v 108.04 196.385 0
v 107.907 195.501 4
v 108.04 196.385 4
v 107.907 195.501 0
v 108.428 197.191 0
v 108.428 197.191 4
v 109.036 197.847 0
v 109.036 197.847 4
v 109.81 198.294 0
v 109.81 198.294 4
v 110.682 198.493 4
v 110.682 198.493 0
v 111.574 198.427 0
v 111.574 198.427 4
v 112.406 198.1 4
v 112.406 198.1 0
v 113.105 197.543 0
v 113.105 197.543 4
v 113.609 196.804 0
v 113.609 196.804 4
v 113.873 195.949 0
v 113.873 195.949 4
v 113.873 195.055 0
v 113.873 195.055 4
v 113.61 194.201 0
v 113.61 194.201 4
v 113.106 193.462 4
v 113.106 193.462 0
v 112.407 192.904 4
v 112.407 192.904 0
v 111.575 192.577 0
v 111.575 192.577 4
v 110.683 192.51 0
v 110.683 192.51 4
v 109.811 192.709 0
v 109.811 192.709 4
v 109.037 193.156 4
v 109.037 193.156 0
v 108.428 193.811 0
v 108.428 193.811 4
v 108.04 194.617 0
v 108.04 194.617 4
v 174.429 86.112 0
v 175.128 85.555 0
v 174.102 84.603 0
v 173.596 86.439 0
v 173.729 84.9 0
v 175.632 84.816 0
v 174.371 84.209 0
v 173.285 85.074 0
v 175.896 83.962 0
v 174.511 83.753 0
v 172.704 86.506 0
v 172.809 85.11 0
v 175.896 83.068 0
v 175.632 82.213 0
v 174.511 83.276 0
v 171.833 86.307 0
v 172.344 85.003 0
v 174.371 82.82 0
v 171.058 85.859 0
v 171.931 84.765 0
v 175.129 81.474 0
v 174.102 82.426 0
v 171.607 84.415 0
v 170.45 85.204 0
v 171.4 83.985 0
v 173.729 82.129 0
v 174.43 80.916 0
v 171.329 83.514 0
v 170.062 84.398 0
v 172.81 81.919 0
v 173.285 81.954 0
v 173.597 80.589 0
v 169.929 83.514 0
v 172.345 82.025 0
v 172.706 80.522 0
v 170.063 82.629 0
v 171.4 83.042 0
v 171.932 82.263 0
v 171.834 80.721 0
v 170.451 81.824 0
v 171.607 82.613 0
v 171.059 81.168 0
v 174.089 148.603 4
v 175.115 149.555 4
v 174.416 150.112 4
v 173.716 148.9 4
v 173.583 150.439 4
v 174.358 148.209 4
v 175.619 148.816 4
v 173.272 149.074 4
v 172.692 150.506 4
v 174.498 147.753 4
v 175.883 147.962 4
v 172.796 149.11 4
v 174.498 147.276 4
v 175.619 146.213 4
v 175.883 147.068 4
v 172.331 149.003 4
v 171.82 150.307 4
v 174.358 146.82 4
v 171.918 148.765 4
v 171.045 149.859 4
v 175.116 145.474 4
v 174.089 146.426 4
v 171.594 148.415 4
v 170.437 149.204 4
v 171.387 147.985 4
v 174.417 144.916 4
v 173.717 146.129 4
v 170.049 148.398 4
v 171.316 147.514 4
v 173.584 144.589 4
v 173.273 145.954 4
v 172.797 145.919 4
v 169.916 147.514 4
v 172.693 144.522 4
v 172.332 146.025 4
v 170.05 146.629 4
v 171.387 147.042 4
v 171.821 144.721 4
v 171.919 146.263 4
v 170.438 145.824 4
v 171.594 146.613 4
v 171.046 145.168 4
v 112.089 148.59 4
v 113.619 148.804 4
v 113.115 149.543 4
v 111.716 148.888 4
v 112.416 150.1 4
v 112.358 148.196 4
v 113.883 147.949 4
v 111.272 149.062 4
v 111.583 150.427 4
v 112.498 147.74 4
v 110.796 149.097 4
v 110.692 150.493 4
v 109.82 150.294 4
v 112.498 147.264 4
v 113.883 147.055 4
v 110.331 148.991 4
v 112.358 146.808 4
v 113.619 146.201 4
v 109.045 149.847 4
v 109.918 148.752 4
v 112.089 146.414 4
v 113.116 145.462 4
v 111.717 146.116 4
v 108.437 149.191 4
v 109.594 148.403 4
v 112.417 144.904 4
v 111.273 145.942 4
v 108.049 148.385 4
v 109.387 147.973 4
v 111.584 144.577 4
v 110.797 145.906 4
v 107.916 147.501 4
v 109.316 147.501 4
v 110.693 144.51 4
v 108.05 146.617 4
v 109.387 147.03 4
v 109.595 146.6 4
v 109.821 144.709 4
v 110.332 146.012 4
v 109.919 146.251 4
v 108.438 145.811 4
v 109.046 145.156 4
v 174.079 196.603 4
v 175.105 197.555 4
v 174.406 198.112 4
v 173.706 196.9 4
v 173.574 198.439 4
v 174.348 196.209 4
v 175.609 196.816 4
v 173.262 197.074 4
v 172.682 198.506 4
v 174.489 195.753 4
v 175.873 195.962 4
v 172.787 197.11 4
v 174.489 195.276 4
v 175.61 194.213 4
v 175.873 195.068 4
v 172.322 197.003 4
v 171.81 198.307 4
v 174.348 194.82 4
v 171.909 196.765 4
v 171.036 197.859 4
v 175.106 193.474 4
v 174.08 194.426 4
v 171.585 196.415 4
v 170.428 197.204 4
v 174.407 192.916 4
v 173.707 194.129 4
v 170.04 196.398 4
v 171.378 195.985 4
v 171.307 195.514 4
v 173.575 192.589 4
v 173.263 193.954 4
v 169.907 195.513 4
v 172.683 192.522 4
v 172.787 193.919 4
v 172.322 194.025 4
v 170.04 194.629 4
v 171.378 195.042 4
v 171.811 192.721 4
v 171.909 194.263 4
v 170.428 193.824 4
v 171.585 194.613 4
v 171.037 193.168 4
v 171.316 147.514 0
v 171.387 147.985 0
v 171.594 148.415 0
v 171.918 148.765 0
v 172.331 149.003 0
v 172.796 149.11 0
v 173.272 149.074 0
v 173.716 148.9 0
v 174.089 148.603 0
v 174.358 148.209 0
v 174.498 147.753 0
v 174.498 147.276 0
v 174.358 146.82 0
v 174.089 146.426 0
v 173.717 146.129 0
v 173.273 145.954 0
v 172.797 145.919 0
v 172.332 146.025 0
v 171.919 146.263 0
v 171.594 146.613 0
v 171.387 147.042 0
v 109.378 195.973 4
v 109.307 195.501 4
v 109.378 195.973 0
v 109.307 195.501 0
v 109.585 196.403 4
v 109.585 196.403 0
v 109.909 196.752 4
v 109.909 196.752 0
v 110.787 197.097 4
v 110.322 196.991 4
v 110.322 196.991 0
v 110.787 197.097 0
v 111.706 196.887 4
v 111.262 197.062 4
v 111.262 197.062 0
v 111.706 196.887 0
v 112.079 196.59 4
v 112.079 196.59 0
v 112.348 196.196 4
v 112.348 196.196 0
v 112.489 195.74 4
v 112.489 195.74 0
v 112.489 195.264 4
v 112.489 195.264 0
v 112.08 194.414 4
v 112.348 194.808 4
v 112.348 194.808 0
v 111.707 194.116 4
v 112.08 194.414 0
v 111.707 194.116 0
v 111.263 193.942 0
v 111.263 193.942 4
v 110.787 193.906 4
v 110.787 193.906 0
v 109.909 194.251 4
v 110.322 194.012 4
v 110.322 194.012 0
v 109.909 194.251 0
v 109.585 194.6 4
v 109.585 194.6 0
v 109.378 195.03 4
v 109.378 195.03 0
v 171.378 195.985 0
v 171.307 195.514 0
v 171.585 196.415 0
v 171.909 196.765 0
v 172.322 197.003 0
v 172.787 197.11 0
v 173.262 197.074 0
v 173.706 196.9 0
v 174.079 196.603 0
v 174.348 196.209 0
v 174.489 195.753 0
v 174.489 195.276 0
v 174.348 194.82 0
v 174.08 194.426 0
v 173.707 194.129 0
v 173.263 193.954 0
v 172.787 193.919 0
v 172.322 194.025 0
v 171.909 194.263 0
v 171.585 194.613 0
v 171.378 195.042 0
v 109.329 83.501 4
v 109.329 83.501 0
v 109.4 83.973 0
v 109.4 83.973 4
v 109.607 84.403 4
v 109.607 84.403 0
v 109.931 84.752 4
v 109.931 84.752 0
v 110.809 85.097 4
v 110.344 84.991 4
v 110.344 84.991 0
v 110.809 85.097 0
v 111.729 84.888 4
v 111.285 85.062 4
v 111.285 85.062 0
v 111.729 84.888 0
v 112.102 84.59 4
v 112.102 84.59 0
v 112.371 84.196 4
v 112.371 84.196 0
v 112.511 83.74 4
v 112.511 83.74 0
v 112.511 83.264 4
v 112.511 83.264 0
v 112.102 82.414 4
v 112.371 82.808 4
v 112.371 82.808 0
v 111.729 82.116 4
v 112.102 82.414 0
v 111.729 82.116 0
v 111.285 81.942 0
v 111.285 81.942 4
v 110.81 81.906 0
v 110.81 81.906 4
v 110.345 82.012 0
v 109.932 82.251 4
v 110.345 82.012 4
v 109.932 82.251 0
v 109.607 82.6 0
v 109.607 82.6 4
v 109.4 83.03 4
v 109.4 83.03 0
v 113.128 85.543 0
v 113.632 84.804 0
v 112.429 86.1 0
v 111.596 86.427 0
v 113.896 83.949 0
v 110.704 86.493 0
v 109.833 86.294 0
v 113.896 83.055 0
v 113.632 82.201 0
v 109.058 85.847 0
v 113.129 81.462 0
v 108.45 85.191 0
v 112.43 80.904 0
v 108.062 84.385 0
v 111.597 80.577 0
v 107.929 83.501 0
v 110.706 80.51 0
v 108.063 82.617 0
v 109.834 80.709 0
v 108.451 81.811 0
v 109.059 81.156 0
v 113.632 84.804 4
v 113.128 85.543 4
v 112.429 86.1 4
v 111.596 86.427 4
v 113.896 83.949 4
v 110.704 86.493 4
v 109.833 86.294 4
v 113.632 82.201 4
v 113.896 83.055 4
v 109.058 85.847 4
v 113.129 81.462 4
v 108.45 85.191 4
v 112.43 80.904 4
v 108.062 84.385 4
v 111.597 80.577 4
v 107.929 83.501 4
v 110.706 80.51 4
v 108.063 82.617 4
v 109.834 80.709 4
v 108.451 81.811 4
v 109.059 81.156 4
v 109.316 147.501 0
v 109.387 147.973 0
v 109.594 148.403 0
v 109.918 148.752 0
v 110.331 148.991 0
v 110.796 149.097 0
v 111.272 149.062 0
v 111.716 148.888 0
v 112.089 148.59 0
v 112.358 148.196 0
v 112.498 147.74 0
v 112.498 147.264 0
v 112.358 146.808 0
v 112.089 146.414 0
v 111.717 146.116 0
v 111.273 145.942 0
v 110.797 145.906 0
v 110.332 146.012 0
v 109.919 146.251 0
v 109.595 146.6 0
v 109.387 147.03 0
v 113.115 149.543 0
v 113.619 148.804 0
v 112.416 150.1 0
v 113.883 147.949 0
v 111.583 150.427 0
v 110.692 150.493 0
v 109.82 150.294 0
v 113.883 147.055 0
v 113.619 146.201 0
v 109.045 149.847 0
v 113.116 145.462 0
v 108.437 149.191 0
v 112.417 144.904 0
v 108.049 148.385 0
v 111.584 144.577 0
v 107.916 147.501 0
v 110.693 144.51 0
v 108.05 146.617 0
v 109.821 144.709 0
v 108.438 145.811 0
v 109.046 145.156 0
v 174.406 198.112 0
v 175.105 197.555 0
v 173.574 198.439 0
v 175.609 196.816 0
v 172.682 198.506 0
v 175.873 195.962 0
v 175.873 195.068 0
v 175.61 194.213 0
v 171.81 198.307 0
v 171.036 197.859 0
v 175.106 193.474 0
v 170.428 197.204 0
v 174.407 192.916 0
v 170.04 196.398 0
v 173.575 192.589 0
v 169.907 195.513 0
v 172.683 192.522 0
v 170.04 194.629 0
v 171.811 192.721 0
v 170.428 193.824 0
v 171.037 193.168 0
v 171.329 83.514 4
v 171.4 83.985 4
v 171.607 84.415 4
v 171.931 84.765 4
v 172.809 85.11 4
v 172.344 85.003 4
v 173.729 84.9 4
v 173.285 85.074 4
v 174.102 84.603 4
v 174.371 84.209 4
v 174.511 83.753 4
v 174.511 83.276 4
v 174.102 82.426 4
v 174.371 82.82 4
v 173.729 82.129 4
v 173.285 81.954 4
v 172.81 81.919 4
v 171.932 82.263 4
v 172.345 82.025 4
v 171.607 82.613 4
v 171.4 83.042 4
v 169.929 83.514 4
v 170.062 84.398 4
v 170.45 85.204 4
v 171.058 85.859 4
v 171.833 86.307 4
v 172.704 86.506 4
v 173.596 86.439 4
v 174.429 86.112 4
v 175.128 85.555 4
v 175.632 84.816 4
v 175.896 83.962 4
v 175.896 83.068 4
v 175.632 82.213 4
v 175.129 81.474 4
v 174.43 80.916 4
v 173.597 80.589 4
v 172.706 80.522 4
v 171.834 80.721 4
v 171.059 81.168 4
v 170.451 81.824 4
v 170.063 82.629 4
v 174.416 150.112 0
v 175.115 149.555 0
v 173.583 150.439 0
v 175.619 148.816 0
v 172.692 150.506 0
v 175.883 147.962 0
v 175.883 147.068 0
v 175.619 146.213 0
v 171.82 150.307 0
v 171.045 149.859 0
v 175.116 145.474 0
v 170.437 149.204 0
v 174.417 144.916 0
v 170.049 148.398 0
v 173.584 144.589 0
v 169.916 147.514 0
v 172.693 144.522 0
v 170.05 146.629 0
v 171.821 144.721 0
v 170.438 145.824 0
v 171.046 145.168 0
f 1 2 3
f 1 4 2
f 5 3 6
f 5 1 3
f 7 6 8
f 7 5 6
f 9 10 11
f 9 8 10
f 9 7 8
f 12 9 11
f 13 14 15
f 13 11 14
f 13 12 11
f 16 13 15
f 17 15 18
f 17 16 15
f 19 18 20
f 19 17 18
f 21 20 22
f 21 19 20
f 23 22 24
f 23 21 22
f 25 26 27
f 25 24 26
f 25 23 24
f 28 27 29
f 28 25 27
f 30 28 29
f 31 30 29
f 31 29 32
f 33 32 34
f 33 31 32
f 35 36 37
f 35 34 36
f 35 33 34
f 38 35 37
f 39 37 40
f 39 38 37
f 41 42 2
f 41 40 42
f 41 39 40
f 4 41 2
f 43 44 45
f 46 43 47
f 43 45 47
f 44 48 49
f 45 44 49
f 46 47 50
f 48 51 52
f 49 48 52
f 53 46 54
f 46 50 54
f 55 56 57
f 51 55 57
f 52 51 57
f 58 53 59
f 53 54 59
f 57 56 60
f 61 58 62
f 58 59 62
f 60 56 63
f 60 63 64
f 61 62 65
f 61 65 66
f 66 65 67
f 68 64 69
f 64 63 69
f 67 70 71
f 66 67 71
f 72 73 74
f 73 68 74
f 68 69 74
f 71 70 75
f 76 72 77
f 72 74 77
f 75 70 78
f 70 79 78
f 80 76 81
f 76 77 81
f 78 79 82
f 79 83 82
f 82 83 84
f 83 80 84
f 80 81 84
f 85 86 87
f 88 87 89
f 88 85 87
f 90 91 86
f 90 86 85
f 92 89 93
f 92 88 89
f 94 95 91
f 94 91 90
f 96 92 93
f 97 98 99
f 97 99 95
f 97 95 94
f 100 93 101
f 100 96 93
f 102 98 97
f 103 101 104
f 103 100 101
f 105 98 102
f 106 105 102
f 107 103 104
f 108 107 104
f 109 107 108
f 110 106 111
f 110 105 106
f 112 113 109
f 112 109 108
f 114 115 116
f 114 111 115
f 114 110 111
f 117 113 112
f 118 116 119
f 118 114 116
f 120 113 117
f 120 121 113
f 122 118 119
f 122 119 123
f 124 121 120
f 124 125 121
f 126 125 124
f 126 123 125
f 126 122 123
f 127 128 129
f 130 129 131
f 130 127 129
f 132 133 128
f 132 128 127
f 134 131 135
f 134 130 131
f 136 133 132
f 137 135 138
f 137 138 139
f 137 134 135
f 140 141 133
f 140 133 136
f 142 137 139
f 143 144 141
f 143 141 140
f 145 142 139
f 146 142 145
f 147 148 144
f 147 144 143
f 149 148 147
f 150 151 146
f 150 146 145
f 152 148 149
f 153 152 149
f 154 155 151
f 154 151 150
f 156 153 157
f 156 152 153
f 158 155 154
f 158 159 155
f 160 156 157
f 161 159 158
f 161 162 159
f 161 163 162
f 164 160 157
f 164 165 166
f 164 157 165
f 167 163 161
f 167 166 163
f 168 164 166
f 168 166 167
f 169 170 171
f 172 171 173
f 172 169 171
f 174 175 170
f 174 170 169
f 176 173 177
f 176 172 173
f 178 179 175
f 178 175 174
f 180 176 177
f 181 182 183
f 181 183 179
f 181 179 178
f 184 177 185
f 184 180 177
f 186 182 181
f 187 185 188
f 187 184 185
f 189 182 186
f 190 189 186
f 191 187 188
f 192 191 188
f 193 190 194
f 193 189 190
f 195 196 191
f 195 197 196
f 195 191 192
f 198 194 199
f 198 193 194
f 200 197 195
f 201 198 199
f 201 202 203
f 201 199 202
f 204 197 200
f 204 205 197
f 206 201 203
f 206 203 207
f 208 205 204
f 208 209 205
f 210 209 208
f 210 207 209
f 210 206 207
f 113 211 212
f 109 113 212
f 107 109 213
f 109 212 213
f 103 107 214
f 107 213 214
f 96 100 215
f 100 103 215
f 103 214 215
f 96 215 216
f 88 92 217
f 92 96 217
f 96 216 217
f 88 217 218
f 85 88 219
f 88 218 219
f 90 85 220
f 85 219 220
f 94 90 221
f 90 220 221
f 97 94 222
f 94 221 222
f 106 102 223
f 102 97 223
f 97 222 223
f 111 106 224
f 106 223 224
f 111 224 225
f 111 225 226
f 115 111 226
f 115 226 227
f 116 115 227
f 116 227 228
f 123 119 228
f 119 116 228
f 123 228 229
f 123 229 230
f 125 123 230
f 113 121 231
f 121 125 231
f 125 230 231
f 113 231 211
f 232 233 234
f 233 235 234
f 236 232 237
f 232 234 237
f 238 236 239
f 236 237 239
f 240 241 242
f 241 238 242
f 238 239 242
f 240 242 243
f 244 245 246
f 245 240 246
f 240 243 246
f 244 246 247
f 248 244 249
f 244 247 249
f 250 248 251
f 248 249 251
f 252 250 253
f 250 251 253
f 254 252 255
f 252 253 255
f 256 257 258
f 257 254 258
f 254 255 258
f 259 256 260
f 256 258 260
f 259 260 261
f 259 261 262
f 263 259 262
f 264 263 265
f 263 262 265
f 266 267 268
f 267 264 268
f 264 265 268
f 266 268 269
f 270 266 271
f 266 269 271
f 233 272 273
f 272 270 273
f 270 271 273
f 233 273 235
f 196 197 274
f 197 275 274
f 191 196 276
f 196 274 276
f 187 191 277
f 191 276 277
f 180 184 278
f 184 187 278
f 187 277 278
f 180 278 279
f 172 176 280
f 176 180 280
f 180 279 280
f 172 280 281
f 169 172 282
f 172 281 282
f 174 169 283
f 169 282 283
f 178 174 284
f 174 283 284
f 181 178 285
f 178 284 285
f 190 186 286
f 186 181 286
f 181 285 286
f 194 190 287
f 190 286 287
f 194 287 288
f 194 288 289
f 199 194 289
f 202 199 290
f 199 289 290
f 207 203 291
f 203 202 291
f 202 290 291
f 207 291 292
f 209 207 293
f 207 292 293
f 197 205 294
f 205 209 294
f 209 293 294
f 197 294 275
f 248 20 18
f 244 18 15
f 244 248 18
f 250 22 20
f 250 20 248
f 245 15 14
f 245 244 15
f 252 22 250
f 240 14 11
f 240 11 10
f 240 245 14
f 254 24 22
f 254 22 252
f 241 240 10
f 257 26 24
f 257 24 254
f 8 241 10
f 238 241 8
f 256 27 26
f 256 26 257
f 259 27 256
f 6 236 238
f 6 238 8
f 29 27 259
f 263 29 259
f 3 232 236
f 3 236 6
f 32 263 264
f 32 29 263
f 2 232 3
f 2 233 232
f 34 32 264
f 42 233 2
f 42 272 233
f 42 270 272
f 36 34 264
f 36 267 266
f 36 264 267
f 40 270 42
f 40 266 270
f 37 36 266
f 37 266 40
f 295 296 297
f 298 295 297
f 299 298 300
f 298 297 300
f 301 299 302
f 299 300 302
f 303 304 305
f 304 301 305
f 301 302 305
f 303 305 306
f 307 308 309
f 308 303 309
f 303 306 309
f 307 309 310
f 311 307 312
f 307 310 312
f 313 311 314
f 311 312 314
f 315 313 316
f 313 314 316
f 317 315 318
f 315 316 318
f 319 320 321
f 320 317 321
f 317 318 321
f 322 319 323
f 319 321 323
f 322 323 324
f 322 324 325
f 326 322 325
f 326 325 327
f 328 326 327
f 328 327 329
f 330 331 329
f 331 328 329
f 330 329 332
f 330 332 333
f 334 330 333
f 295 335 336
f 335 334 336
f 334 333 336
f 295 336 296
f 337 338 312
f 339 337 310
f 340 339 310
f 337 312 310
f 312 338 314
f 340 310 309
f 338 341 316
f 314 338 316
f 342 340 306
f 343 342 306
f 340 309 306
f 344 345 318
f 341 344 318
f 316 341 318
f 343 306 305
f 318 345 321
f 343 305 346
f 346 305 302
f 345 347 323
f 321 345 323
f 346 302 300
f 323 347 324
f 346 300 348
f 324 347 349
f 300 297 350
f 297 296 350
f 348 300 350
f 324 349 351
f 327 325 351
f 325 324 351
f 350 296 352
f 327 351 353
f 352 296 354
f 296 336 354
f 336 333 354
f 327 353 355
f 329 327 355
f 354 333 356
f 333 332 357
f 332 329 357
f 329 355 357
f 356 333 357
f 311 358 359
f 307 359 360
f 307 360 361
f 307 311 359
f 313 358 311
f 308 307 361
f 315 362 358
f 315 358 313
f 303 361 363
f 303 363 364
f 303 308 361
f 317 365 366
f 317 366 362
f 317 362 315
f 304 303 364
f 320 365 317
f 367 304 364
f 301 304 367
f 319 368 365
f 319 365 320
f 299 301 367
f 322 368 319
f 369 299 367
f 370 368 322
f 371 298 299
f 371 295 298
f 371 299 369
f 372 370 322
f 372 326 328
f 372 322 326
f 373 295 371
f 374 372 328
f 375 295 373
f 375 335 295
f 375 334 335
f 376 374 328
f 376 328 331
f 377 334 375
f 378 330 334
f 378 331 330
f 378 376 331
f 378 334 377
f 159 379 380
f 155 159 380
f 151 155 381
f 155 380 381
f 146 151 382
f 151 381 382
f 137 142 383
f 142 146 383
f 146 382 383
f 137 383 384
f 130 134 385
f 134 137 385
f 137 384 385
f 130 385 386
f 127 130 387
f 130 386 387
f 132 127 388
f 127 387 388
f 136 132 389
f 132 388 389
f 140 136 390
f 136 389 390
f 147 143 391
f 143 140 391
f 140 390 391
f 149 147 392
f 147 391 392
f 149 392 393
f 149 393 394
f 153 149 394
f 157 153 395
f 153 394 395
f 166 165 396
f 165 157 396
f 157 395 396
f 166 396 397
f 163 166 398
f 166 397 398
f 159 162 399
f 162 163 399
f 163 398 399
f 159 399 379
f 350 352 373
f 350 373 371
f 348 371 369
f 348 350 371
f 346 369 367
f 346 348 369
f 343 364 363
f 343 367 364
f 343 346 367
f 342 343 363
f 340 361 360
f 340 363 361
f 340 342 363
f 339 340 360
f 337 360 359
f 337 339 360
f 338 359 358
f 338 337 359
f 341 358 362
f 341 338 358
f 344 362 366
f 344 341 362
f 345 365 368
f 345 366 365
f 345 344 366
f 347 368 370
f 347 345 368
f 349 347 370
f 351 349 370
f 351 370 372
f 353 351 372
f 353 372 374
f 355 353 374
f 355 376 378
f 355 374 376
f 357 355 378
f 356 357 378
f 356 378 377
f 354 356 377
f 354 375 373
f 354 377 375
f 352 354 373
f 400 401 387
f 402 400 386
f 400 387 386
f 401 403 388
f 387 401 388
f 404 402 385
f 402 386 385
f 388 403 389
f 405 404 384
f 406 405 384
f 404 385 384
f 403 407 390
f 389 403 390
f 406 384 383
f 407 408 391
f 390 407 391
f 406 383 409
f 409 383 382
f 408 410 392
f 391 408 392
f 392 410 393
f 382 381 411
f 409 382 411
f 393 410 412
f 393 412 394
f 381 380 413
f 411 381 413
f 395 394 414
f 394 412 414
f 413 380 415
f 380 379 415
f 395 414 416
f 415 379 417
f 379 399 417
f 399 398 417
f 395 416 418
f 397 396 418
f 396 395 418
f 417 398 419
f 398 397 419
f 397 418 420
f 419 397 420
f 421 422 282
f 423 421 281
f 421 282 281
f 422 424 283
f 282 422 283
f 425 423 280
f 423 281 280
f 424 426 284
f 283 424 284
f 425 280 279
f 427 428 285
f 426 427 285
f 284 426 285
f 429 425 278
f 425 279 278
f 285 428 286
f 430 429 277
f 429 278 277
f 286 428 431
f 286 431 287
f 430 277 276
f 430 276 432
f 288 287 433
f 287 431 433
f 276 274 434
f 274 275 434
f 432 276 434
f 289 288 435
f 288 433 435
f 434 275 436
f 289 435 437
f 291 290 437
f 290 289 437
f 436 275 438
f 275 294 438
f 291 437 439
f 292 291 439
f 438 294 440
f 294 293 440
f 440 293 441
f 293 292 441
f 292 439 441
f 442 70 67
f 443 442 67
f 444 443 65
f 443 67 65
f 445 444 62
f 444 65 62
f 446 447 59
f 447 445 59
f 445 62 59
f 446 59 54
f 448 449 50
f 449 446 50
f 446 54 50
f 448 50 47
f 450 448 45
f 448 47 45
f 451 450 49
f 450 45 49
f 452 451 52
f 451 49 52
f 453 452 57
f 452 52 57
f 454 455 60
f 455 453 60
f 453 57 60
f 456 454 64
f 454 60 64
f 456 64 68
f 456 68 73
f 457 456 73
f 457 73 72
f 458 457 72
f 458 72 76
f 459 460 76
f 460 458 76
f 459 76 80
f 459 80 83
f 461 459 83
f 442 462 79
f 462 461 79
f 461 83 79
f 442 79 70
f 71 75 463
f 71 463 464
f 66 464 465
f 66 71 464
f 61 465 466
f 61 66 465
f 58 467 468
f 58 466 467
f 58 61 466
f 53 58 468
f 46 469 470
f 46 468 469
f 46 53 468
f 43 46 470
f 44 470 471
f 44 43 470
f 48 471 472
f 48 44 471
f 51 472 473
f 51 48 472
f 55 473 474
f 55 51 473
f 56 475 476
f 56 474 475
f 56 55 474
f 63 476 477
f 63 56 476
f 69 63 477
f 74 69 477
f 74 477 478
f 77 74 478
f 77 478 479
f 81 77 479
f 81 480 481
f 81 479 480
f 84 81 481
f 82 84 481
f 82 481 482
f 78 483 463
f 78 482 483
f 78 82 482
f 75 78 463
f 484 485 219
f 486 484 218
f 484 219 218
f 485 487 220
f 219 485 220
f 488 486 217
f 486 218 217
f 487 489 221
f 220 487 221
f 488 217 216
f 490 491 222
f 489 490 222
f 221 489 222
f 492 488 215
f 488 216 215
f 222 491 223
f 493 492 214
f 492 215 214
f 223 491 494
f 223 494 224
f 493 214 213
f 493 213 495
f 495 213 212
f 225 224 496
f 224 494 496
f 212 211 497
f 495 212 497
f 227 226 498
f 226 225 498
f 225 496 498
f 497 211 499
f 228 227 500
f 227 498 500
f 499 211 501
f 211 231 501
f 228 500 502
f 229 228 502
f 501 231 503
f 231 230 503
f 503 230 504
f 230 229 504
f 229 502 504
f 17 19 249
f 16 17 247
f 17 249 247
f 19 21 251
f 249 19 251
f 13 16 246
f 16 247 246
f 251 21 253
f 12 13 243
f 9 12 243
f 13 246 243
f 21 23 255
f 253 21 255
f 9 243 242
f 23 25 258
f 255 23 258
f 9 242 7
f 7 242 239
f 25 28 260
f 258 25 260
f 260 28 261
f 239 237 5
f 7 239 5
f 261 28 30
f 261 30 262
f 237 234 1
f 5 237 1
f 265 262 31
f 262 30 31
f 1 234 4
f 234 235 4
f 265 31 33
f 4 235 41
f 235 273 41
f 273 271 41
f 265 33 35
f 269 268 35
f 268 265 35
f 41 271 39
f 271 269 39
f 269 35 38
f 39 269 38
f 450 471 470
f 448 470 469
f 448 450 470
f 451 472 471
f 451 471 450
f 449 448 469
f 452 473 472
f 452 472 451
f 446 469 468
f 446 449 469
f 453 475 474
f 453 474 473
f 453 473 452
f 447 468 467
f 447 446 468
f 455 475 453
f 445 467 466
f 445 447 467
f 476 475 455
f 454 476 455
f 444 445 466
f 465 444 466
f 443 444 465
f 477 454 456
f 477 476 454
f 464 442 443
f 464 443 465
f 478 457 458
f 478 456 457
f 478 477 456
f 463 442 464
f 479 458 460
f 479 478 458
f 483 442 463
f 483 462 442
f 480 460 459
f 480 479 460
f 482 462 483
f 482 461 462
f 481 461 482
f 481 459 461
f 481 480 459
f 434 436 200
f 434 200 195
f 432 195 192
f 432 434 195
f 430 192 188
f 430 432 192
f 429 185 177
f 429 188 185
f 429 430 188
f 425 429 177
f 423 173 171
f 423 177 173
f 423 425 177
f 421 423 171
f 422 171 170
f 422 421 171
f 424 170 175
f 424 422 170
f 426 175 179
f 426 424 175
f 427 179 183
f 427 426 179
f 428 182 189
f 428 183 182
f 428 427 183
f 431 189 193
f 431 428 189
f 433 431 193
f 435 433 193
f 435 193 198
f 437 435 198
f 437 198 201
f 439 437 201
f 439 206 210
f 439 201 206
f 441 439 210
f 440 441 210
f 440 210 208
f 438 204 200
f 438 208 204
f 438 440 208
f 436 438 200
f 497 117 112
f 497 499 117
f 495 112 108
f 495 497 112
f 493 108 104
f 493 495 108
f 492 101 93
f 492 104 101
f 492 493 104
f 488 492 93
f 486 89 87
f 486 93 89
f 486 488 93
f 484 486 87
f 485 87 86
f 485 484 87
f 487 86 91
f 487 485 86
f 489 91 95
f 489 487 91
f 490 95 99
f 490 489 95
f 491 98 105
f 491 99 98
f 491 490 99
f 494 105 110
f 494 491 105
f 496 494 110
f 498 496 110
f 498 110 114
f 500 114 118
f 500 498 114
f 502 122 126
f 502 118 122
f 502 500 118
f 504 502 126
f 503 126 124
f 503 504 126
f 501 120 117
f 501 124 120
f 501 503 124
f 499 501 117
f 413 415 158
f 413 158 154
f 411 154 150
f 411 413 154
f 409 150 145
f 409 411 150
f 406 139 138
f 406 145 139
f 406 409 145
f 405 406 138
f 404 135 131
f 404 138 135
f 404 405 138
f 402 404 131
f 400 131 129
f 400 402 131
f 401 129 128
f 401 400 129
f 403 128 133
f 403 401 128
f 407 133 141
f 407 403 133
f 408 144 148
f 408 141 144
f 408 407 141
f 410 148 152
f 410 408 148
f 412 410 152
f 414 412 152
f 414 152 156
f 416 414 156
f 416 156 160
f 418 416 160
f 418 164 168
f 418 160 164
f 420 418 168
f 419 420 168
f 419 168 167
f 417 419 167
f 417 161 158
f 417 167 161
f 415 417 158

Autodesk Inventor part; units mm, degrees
ref_plane "YZ Plane" through (0, 0, 0) normal (1, 0, 0) x (0, 1, 0)
ref_plane "XZ Plane" through (0, 0, 0) normal (0, 1, 0) x (-1, 0, 0)
ref_plane "XY Plane" through (0, 0, 0) normal (0, 0, 1) x (1, 0, 0)
ref_plane "РабПлоскость1" through (216.9124, 167.0229, 0) normal (0, 0, 1) x (-1, -0.0002, 0)
sketch "Эскиз1" plane through (216.9124, 167.0229, 0) normal (0, 0, 1) x (-1, -0.0002, 0)
  circle A0 centre (106, 83.5) radius 1.6 projected
  circle A1 centre (44, 83.5) radius 1.6 projected
  circle A2 centre (44, 19.5) radius 1.6 projected
  circle A3 centre (106, 19.5) radius 1.6 projected
  circle A4 centre (106, -28.5) radius 1.6 projected
  circle A5 centre (44, -28.5) radius 1.6 projected
  circle A6 centre (106, -28.5) radius 3
  circle A7 centre (44, -28.5) radius 3
  circle A8 centre (106, 19.5) radius 3
  circle A9 centre (44, 19.5) radius 3
  circle A10 centre (44, 83.5) radius 3
  circle A11 centre (106, 83.5) radius 3
  point P0 (216.9474, 166.9774)
  dimension "d0" = 6
  dimension "d1" = 6
extrude "Выдавливание1" add sketch "Эскиз1" along normal blind 4
properties part number "проставка платы"
